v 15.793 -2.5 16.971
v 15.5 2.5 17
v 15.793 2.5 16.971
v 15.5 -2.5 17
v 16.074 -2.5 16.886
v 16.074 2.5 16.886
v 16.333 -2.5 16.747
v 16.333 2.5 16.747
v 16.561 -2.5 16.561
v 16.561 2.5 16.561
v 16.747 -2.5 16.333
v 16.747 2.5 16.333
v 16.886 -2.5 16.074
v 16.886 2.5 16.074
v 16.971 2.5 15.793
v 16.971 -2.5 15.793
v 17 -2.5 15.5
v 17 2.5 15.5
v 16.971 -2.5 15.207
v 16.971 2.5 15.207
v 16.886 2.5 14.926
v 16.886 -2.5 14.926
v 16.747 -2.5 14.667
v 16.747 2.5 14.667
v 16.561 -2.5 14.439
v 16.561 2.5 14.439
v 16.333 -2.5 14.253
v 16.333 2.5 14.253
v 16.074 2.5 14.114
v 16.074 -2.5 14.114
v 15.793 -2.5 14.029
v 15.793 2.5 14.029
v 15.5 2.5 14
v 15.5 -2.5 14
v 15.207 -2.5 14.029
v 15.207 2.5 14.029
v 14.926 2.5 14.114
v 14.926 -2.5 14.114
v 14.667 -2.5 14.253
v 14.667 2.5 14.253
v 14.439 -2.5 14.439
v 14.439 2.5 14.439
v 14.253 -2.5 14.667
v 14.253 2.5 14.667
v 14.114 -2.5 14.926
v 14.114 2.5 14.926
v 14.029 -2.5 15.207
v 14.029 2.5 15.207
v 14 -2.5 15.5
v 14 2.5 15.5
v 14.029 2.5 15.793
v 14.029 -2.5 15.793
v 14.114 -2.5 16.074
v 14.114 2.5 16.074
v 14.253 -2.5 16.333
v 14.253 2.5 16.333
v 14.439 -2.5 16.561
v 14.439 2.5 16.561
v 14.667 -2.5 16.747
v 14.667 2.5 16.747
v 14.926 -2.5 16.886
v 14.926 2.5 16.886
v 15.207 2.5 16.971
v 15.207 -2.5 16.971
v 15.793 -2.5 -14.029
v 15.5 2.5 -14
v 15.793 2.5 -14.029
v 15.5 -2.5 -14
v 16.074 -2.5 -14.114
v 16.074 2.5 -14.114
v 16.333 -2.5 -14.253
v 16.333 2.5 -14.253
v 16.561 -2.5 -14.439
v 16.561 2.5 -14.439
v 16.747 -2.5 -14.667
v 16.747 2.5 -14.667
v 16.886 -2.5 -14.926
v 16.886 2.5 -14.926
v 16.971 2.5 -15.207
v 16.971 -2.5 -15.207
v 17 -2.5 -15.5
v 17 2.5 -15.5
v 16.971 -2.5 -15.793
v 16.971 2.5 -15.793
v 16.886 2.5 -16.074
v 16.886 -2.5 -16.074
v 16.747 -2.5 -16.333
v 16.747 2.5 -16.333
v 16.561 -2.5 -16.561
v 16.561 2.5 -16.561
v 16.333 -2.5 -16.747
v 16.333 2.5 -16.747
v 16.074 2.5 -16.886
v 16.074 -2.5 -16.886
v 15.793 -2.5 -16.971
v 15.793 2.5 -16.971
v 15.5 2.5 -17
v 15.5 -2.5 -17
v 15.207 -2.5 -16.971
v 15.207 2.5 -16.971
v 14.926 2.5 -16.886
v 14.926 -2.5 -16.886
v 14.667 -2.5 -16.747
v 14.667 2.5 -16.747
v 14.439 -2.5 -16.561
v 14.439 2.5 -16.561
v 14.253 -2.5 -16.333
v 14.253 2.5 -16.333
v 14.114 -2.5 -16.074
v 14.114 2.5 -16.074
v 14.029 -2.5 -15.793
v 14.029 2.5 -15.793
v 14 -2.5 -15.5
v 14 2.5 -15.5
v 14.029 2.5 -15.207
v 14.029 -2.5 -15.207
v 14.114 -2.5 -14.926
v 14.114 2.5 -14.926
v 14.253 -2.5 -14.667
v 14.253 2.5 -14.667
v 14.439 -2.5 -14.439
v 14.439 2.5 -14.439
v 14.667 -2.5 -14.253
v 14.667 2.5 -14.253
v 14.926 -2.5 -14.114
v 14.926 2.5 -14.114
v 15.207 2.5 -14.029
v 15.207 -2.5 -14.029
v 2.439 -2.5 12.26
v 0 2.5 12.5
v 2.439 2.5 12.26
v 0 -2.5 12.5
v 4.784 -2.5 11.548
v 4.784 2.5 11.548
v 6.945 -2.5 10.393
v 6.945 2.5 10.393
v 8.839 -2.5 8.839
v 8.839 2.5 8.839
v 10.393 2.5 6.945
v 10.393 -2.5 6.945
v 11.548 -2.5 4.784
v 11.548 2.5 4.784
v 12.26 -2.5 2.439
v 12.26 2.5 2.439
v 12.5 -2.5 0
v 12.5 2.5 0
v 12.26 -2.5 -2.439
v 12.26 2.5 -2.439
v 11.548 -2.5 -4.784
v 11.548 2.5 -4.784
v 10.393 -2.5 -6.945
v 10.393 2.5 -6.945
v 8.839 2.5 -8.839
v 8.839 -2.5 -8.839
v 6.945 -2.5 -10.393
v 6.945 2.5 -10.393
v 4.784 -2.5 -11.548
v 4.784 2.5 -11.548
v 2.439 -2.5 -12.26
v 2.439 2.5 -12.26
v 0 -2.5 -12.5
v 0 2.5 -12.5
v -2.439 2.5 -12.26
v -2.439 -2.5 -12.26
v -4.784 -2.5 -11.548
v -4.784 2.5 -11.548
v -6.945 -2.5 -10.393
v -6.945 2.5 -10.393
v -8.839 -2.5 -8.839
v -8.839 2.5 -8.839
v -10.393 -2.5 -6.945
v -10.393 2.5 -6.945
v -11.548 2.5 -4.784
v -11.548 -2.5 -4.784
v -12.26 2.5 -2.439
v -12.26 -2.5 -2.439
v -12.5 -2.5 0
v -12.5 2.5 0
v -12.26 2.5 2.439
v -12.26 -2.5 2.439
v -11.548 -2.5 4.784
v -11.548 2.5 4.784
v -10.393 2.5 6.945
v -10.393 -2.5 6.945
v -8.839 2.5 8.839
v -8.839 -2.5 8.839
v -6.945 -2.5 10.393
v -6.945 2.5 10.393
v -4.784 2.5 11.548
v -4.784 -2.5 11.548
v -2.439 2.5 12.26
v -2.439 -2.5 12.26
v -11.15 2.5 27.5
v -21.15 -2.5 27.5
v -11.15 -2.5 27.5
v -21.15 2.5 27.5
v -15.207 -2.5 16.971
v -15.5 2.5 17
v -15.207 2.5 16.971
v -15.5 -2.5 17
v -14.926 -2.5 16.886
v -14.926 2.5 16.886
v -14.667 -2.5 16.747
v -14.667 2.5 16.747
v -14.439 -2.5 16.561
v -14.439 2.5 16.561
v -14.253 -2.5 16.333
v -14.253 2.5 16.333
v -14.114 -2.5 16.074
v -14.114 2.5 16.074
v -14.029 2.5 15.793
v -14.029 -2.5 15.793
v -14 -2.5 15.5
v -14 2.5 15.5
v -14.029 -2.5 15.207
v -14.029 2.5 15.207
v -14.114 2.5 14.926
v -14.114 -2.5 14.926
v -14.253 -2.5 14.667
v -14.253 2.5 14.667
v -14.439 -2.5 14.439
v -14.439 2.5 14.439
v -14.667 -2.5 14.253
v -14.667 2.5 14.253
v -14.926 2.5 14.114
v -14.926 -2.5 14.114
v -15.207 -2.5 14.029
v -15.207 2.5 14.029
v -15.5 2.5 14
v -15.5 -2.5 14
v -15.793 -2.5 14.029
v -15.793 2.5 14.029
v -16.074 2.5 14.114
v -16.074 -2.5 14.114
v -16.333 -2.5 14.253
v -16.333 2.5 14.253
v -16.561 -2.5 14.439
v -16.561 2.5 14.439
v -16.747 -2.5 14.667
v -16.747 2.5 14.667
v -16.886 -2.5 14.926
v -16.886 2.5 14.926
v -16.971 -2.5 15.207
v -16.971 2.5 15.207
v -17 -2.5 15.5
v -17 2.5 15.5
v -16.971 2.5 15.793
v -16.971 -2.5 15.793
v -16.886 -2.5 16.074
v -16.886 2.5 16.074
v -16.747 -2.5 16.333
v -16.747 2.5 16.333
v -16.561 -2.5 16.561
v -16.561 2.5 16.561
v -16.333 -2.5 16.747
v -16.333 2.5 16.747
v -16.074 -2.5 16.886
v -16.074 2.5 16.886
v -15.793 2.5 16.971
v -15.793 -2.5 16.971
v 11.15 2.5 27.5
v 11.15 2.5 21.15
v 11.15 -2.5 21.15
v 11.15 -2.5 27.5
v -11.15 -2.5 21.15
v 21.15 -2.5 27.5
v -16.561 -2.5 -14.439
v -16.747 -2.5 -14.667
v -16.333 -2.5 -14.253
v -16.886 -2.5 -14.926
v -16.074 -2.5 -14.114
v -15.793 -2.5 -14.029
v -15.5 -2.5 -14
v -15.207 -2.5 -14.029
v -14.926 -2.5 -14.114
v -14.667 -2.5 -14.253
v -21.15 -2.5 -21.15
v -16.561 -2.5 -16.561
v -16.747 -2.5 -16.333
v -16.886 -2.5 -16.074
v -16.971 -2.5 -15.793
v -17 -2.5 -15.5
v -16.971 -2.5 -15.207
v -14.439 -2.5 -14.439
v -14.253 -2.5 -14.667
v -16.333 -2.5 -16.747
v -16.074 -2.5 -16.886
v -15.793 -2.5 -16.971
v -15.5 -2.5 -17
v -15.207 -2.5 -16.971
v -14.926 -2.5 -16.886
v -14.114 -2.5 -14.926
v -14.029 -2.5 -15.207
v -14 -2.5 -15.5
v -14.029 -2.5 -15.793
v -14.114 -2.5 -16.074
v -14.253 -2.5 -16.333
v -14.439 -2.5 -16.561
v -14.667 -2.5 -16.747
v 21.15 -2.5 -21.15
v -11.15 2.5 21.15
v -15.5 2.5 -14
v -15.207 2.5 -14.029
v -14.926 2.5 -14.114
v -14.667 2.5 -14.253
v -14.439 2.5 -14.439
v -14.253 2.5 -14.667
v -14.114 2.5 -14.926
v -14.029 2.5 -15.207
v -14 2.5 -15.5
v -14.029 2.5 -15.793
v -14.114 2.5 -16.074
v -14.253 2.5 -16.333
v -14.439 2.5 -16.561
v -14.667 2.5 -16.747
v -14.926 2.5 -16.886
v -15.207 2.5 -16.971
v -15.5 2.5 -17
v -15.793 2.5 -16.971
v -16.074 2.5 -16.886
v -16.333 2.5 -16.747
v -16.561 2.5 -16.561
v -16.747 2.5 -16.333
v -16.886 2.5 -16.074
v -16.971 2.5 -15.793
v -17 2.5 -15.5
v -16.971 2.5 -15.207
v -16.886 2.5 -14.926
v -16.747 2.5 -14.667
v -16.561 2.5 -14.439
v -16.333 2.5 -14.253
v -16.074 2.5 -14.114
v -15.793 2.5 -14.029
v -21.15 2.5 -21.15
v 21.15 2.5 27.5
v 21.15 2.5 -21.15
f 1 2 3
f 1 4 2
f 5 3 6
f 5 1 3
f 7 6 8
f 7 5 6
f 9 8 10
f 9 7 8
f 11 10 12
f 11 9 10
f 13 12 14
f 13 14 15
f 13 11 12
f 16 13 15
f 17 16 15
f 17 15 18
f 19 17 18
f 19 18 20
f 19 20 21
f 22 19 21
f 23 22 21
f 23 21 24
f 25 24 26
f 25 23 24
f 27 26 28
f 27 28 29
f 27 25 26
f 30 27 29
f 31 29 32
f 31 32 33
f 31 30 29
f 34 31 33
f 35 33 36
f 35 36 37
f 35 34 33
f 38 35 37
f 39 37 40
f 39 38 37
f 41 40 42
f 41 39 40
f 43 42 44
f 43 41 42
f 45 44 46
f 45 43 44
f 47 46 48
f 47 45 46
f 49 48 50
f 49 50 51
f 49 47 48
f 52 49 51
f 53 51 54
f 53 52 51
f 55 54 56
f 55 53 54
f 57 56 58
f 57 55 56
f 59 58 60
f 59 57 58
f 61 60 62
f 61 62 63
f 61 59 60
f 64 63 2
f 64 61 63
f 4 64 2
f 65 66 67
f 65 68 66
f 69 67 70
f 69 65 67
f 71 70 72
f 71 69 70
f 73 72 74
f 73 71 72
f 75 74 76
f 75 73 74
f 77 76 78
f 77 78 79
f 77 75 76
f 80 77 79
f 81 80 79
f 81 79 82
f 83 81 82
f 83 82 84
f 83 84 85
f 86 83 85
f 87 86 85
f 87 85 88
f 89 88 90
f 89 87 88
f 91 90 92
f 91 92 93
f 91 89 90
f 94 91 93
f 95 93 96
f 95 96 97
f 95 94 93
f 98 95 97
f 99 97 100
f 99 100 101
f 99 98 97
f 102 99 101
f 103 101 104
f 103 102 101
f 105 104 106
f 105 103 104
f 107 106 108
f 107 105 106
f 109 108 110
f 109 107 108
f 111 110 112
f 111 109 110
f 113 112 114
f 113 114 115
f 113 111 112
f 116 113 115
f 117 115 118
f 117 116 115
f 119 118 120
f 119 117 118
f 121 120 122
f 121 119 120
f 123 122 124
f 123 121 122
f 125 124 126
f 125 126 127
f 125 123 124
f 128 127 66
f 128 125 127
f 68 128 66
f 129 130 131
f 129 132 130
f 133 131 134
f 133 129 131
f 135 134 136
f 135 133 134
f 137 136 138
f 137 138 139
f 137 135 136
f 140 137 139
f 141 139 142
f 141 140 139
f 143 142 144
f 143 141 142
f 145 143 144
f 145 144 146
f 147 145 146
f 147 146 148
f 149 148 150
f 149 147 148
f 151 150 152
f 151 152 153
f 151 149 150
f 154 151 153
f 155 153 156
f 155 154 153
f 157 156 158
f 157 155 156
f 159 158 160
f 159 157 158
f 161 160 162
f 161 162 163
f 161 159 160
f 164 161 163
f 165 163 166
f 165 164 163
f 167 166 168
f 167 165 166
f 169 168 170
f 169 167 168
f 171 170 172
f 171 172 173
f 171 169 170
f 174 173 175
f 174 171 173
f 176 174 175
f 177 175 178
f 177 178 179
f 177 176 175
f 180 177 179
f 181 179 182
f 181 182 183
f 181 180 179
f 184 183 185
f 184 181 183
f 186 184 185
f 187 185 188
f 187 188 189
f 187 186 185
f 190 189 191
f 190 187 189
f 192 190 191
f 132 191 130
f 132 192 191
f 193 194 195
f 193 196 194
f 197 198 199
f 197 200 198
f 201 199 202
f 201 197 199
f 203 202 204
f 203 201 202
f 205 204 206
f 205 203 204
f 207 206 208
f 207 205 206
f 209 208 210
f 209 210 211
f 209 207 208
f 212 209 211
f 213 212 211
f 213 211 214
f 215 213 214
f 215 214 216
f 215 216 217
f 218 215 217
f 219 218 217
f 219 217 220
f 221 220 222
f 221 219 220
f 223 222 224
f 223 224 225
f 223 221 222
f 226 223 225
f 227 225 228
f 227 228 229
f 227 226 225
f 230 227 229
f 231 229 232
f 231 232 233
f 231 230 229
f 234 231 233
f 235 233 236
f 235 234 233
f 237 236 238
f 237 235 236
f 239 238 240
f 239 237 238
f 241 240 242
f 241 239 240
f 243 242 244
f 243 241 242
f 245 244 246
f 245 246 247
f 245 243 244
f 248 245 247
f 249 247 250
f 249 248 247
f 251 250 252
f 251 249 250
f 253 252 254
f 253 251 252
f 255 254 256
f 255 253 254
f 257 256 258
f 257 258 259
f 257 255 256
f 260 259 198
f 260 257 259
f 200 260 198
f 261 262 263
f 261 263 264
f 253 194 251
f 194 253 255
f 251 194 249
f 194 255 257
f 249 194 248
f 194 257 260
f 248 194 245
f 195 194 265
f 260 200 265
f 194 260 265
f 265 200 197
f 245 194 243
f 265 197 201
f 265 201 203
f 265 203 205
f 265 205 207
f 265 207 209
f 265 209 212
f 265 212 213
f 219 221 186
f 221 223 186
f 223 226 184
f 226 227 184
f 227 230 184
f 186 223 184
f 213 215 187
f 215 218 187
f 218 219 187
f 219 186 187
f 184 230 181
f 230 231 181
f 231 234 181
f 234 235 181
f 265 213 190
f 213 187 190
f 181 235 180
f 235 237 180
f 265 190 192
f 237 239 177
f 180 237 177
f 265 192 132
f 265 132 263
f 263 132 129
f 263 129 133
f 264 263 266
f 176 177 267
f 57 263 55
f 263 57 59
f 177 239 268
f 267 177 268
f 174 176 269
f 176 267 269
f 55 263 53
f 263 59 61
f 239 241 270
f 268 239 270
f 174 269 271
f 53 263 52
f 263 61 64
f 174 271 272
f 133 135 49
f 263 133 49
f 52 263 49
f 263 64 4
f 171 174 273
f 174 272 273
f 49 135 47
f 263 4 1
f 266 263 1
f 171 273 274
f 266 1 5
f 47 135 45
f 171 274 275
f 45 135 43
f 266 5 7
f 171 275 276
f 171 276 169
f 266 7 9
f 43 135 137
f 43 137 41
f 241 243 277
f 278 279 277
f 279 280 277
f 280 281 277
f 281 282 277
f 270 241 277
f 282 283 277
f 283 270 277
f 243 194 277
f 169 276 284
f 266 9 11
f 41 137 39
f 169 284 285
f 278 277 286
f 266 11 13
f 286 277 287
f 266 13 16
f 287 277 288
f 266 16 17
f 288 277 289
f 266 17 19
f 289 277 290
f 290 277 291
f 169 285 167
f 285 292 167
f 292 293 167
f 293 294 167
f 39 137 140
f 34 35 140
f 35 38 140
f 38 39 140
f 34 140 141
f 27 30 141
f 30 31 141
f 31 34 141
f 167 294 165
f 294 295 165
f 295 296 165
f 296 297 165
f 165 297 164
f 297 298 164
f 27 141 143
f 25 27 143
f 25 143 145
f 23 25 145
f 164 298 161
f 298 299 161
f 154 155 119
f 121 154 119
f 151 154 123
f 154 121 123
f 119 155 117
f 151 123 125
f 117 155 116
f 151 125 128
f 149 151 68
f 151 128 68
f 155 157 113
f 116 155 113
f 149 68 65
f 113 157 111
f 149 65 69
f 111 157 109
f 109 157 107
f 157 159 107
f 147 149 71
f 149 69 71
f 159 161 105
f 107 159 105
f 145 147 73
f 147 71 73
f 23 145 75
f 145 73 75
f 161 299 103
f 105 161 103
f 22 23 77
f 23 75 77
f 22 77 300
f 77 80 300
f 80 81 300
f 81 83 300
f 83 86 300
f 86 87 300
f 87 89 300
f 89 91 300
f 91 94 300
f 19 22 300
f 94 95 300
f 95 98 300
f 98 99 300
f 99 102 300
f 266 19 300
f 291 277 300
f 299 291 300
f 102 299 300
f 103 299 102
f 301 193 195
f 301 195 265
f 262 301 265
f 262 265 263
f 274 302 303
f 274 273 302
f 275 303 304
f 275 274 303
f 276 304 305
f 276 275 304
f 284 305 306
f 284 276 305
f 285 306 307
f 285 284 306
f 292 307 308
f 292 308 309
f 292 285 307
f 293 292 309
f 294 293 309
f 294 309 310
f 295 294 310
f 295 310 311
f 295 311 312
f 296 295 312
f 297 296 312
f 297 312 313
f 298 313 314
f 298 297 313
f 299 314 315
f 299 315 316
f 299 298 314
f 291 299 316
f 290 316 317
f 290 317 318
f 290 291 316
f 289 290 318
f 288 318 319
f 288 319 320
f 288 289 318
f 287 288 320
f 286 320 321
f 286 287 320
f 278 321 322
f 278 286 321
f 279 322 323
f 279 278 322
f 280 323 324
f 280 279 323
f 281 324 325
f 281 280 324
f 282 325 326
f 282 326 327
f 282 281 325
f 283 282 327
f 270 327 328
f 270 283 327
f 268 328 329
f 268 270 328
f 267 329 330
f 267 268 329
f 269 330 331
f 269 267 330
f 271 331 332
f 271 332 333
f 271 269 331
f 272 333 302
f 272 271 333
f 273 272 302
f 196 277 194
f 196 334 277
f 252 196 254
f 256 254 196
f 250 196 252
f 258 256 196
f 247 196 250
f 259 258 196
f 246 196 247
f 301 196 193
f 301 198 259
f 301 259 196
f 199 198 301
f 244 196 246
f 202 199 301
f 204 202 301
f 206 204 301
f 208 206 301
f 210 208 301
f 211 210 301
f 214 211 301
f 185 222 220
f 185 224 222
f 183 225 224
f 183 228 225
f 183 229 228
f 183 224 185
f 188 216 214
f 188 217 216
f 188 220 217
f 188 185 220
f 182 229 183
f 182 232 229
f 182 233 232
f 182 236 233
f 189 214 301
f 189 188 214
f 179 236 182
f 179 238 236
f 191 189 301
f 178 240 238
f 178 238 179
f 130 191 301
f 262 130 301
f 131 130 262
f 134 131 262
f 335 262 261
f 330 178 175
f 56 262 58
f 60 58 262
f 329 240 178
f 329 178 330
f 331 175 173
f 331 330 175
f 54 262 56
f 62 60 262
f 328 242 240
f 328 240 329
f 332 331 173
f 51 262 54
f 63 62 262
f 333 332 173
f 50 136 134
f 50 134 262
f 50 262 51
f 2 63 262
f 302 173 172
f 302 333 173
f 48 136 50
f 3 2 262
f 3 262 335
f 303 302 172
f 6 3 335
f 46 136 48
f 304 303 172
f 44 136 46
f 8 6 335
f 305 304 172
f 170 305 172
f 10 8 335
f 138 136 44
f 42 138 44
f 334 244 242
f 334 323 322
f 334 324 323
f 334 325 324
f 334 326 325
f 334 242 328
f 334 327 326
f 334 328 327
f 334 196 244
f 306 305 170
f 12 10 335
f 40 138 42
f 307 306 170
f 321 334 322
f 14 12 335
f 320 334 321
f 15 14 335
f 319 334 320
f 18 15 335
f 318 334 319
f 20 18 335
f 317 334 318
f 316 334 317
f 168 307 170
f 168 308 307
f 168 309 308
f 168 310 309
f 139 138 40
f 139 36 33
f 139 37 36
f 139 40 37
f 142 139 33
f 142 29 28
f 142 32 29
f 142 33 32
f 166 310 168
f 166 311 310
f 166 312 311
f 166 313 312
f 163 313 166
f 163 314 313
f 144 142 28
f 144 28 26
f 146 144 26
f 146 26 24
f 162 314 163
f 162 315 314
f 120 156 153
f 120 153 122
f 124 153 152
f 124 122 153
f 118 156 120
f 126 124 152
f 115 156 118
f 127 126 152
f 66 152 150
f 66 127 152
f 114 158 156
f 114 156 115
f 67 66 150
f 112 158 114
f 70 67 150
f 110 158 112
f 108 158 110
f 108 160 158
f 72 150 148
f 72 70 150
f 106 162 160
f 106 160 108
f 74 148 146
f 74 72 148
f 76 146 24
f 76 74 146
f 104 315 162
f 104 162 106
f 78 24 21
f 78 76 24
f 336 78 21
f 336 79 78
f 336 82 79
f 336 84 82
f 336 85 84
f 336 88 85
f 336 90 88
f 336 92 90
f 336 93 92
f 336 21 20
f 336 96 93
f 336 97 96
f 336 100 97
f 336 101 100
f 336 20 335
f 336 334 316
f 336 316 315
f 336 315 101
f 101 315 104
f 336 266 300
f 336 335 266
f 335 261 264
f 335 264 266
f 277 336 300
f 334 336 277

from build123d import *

# Parameters (mm, degrees)
SKETCH1_R           = 12.5
SKETCH1_R_2         = 1.5
BOSS_EXTRUDE1_DEPTH = 2.5


with BuildPart() as part:
    # Sketch1 → Boss-Extrude1 (new, symmetric)
    with BuildSketch(Plane(origin=(0, 0, 0), x_dir=(1, 0, 0), z_dir=(0, 1, 0))):
        Polygon((-21.15, -21.15), (-21.15, -27.5), (-11.15, -27.5), (-11.15, -21.15), (11.15, -21.15), (11.15, -27.5), (21.15, -27.5), (21.15, -21.15), (21.15, 21.15), (-21.15, 21.15), align=None)
        with Locations(Location((0, 0, 0), (0, 0, 270))):
            Circle(SKETCH1_R, mode=Mode.SUBTRACT)
        with Locations(Location((-15.5, 15.5, 0), (0, 0, 270))):
            Circle(SKETCH1_R_2, mode=Mode.SUBTRACT)
        with Locations(Location((15.5, 15.5, 0), (0, 0, 270))):
            Circle(SKETCH1_R_2, mode=Mode.SUBTRACT)
        with Locations(Location((15.5, -15.5, 0), (0, 0, 270))):
            Circle(SKETCH1_R_2, mode=Mode.SUBTRACT)
        with Locations(Location((-15.5, -15.5, 0), (0, 0, 270))):
            Circle(SKETCH1_R_2, mode=Mode.SUBTRACT)
    extrude(amount=BOSS_EXTRUDE1_DEPTH, both=True)


solid = part.part
